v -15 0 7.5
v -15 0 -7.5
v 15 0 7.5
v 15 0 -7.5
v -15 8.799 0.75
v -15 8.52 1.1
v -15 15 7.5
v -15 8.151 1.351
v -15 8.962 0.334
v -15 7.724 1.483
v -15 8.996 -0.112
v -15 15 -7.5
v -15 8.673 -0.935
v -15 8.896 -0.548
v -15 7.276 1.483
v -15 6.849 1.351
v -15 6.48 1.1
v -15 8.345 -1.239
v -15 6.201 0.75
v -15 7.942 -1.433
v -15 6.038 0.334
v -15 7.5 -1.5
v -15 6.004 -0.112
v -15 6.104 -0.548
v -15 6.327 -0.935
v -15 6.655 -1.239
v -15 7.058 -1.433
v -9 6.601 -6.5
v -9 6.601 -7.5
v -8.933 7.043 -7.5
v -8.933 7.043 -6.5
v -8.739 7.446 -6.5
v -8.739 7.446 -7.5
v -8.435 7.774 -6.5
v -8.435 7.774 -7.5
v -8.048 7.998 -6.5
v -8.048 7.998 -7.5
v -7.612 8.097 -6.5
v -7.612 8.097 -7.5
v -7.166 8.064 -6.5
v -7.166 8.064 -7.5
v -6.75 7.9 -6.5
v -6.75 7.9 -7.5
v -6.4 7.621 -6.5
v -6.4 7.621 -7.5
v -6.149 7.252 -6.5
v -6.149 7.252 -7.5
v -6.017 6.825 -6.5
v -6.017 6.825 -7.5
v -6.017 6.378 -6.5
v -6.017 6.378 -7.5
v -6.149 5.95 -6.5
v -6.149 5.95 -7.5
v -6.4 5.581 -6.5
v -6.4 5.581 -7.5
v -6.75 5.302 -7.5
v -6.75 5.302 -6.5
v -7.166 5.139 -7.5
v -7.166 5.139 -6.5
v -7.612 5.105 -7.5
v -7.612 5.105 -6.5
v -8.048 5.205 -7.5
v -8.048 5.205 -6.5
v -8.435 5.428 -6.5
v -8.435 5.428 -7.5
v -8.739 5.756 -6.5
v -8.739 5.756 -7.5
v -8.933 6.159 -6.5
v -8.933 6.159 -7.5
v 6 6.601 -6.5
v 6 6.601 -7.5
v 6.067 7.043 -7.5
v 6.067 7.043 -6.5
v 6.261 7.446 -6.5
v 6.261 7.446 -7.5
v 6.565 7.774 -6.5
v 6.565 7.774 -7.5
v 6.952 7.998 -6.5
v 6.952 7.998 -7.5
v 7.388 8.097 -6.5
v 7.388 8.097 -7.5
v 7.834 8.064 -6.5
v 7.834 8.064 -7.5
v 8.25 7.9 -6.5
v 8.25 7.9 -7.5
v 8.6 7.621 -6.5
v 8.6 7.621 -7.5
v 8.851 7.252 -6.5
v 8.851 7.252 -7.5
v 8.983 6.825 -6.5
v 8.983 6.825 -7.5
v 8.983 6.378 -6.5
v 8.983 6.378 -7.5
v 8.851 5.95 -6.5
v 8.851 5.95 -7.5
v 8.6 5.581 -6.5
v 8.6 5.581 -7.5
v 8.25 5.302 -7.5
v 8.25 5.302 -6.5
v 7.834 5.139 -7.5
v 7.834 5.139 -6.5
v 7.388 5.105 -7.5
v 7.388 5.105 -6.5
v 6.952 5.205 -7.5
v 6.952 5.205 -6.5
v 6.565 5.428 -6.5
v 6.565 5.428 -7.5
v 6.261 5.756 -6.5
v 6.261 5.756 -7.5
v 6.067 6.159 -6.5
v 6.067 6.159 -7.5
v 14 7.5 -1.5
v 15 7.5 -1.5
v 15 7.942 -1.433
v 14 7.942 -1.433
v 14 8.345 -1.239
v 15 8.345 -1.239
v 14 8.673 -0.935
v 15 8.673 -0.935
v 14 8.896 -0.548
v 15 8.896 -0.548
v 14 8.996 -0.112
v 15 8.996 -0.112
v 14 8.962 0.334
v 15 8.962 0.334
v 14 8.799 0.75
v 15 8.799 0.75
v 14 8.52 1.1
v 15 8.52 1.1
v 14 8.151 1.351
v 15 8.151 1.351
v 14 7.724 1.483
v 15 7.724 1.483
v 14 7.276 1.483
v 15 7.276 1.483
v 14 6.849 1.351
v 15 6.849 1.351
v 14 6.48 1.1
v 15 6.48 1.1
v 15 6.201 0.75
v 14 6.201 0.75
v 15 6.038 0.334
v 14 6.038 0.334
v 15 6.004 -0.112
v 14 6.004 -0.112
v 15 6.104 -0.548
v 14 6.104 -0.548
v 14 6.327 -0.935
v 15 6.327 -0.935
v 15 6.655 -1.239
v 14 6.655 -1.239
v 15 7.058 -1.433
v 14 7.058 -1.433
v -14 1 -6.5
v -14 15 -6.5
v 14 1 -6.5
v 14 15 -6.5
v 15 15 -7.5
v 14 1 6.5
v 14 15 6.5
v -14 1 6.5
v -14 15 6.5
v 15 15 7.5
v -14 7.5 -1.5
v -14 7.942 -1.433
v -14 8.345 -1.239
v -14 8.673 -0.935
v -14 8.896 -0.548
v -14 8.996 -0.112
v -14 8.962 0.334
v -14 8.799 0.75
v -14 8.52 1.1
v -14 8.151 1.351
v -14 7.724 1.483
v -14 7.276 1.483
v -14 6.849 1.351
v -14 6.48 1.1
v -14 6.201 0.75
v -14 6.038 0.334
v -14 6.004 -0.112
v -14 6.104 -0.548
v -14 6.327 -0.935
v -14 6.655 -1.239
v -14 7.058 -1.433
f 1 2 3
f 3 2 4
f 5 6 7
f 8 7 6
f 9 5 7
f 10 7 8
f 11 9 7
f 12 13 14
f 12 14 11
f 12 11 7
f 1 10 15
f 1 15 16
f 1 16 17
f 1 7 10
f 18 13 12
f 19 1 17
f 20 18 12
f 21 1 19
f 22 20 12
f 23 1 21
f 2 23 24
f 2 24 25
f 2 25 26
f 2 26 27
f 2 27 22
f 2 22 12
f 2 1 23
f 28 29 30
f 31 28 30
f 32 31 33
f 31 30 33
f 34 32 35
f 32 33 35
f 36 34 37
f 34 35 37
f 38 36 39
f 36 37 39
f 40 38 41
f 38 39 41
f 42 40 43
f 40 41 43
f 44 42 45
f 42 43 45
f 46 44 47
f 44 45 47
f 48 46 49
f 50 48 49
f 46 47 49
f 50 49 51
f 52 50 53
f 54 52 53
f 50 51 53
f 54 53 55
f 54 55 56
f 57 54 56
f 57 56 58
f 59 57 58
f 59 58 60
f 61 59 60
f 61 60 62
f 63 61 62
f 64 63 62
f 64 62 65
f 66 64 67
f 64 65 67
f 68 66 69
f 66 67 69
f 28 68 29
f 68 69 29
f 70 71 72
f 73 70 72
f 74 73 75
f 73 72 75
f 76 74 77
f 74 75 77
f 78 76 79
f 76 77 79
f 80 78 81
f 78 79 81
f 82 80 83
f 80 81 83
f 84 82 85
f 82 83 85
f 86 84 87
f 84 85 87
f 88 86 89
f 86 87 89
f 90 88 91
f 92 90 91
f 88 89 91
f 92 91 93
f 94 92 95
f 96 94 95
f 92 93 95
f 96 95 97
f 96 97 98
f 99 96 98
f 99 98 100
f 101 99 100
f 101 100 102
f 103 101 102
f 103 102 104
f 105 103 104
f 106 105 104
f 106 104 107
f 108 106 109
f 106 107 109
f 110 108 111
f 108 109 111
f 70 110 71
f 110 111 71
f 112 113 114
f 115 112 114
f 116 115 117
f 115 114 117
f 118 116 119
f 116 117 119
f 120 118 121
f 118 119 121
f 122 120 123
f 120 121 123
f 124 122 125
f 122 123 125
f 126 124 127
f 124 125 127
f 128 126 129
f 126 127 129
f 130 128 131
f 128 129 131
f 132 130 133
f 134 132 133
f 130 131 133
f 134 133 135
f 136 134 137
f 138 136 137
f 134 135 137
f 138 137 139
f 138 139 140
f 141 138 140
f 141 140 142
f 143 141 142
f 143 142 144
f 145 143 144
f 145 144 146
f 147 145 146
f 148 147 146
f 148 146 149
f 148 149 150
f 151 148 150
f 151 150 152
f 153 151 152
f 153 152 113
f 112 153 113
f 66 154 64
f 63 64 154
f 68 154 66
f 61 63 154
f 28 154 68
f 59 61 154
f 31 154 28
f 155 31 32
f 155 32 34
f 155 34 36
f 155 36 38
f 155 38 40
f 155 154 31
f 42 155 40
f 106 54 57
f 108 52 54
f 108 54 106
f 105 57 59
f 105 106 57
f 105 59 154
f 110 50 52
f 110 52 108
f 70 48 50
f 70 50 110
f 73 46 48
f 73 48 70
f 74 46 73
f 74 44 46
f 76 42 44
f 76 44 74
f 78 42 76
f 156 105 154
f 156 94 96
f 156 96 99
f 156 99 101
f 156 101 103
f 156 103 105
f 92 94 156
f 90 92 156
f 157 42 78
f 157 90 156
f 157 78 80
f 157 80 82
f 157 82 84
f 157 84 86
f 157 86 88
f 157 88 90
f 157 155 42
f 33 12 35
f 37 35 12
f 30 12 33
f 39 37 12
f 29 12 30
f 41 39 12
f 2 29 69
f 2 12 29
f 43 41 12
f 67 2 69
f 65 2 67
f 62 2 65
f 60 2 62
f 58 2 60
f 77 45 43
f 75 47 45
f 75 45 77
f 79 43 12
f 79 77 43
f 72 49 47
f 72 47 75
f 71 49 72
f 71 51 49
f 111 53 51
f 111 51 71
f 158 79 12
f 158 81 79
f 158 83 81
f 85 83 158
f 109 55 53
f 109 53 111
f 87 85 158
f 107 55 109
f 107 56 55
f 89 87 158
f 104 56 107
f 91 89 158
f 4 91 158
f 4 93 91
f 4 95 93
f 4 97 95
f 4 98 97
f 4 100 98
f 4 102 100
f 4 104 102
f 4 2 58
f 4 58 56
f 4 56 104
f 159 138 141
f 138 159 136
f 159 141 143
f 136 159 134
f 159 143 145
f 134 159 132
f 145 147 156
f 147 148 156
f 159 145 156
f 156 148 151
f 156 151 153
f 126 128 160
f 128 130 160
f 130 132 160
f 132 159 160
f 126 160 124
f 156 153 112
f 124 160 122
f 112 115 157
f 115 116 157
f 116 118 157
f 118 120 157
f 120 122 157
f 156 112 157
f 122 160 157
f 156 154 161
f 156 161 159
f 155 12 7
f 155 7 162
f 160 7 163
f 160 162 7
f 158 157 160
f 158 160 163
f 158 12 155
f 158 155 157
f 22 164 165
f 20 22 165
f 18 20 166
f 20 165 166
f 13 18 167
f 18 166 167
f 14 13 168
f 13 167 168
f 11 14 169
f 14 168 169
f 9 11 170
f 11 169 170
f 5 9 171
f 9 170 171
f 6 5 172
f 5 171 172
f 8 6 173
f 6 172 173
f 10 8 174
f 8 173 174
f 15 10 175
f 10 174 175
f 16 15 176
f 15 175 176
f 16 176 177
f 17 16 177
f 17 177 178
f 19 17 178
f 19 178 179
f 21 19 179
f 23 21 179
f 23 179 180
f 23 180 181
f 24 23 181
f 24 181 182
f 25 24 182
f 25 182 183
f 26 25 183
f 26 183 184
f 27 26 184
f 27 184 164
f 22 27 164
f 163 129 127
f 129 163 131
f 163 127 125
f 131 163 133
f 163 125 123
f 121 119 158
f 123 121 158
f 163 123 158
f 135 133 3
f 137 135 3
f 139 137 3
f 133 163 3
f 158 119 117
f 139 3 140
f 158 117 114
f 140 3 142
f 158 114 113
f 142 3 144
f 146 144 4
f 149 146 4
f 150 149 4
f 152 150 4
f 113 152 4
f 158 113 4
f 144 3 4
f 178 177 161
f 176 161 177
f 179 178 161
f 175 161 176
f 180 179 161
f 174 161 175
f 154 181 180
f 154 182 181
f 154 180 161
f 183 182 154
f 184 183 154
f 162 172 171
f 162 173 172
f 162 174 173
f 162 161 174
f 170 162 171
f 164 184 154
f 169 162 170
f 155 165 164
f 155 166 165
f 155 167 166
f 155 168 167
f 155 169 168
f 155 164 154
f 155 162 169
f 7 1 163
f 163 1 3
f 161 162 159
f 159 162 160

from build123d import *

# Parameters (mm, degrees)
SKETCH1_W           = 30
SKETCH1_H           = 15
BOSS_EXTRUDE1_DEPTH = 15
SKETCH2_W           = 28
SKETCH2_H           = 13
CUT_EXTRUDE1_DEPTH  = 14
SKETCH3_R           = 1.5
CUT_EXTRUDE2_DEPTH  = 31
SKETCH4_R           = 1.5
CUT_EXTRUDE3_DEPTH  = 1


with BuildPart() as part:
    # Sketch1 → Boss-Extrude1 (new body)
    with BuildSketch(Plane(origin=(0, 0, 0), x_dir=(1, 0, 0), z_dir=(0, 1, 0))):
        Rectangle(SKETCH1_W, SKETCH1_H)
    extrude(amount=BOSS_EXTRUDE1_DEPTH)

    # Sketch2 → Cut-Extrude1 (cut)
    with BuildSketch(Plane(origin=(0, 15, 0), x_dir=(1, 0, 0), z_dir=(0, 1, 0))):
        Rectangle(SKETCH2_W, SKETCH2_H)
    extrude(amount=-CUT_EXTRUDE1_DEPTH, mode=Mode.SUBTRACT)

    # Sketch3 → Cut-Extrude2 (cut, through all)
    with BuildSketch(Plane(origin=(15, 0, 0), x_dir=(0, 0, -1), z_dir=(1, 0, 0))):
        with Locations((0, 7.5)):
            Circle(SKETCH3_R)
    extrude(amount=-CUT_EXTRUDE2_DEPTH, mode=Mode.SUBTRACT)

    # Sketch4 → Cut-Extrude3 (cut)
    with BuildSketch(Plane(origin=(0, 0, -7.5), x_dir=(-1, 0, 0), z_dir=(0, 0, -1))):
        with Locations((-7.5, 6.601224847)):
            Circle(SKETCH4_R)
        with Locations((7.5, 6.601224847)):
            Circle(SKETCH4_R)
    extrude(amount=-CUT_EXTRUDE3_DEPTH, mode=Mode.SUBTRACT)


solid = part.part
